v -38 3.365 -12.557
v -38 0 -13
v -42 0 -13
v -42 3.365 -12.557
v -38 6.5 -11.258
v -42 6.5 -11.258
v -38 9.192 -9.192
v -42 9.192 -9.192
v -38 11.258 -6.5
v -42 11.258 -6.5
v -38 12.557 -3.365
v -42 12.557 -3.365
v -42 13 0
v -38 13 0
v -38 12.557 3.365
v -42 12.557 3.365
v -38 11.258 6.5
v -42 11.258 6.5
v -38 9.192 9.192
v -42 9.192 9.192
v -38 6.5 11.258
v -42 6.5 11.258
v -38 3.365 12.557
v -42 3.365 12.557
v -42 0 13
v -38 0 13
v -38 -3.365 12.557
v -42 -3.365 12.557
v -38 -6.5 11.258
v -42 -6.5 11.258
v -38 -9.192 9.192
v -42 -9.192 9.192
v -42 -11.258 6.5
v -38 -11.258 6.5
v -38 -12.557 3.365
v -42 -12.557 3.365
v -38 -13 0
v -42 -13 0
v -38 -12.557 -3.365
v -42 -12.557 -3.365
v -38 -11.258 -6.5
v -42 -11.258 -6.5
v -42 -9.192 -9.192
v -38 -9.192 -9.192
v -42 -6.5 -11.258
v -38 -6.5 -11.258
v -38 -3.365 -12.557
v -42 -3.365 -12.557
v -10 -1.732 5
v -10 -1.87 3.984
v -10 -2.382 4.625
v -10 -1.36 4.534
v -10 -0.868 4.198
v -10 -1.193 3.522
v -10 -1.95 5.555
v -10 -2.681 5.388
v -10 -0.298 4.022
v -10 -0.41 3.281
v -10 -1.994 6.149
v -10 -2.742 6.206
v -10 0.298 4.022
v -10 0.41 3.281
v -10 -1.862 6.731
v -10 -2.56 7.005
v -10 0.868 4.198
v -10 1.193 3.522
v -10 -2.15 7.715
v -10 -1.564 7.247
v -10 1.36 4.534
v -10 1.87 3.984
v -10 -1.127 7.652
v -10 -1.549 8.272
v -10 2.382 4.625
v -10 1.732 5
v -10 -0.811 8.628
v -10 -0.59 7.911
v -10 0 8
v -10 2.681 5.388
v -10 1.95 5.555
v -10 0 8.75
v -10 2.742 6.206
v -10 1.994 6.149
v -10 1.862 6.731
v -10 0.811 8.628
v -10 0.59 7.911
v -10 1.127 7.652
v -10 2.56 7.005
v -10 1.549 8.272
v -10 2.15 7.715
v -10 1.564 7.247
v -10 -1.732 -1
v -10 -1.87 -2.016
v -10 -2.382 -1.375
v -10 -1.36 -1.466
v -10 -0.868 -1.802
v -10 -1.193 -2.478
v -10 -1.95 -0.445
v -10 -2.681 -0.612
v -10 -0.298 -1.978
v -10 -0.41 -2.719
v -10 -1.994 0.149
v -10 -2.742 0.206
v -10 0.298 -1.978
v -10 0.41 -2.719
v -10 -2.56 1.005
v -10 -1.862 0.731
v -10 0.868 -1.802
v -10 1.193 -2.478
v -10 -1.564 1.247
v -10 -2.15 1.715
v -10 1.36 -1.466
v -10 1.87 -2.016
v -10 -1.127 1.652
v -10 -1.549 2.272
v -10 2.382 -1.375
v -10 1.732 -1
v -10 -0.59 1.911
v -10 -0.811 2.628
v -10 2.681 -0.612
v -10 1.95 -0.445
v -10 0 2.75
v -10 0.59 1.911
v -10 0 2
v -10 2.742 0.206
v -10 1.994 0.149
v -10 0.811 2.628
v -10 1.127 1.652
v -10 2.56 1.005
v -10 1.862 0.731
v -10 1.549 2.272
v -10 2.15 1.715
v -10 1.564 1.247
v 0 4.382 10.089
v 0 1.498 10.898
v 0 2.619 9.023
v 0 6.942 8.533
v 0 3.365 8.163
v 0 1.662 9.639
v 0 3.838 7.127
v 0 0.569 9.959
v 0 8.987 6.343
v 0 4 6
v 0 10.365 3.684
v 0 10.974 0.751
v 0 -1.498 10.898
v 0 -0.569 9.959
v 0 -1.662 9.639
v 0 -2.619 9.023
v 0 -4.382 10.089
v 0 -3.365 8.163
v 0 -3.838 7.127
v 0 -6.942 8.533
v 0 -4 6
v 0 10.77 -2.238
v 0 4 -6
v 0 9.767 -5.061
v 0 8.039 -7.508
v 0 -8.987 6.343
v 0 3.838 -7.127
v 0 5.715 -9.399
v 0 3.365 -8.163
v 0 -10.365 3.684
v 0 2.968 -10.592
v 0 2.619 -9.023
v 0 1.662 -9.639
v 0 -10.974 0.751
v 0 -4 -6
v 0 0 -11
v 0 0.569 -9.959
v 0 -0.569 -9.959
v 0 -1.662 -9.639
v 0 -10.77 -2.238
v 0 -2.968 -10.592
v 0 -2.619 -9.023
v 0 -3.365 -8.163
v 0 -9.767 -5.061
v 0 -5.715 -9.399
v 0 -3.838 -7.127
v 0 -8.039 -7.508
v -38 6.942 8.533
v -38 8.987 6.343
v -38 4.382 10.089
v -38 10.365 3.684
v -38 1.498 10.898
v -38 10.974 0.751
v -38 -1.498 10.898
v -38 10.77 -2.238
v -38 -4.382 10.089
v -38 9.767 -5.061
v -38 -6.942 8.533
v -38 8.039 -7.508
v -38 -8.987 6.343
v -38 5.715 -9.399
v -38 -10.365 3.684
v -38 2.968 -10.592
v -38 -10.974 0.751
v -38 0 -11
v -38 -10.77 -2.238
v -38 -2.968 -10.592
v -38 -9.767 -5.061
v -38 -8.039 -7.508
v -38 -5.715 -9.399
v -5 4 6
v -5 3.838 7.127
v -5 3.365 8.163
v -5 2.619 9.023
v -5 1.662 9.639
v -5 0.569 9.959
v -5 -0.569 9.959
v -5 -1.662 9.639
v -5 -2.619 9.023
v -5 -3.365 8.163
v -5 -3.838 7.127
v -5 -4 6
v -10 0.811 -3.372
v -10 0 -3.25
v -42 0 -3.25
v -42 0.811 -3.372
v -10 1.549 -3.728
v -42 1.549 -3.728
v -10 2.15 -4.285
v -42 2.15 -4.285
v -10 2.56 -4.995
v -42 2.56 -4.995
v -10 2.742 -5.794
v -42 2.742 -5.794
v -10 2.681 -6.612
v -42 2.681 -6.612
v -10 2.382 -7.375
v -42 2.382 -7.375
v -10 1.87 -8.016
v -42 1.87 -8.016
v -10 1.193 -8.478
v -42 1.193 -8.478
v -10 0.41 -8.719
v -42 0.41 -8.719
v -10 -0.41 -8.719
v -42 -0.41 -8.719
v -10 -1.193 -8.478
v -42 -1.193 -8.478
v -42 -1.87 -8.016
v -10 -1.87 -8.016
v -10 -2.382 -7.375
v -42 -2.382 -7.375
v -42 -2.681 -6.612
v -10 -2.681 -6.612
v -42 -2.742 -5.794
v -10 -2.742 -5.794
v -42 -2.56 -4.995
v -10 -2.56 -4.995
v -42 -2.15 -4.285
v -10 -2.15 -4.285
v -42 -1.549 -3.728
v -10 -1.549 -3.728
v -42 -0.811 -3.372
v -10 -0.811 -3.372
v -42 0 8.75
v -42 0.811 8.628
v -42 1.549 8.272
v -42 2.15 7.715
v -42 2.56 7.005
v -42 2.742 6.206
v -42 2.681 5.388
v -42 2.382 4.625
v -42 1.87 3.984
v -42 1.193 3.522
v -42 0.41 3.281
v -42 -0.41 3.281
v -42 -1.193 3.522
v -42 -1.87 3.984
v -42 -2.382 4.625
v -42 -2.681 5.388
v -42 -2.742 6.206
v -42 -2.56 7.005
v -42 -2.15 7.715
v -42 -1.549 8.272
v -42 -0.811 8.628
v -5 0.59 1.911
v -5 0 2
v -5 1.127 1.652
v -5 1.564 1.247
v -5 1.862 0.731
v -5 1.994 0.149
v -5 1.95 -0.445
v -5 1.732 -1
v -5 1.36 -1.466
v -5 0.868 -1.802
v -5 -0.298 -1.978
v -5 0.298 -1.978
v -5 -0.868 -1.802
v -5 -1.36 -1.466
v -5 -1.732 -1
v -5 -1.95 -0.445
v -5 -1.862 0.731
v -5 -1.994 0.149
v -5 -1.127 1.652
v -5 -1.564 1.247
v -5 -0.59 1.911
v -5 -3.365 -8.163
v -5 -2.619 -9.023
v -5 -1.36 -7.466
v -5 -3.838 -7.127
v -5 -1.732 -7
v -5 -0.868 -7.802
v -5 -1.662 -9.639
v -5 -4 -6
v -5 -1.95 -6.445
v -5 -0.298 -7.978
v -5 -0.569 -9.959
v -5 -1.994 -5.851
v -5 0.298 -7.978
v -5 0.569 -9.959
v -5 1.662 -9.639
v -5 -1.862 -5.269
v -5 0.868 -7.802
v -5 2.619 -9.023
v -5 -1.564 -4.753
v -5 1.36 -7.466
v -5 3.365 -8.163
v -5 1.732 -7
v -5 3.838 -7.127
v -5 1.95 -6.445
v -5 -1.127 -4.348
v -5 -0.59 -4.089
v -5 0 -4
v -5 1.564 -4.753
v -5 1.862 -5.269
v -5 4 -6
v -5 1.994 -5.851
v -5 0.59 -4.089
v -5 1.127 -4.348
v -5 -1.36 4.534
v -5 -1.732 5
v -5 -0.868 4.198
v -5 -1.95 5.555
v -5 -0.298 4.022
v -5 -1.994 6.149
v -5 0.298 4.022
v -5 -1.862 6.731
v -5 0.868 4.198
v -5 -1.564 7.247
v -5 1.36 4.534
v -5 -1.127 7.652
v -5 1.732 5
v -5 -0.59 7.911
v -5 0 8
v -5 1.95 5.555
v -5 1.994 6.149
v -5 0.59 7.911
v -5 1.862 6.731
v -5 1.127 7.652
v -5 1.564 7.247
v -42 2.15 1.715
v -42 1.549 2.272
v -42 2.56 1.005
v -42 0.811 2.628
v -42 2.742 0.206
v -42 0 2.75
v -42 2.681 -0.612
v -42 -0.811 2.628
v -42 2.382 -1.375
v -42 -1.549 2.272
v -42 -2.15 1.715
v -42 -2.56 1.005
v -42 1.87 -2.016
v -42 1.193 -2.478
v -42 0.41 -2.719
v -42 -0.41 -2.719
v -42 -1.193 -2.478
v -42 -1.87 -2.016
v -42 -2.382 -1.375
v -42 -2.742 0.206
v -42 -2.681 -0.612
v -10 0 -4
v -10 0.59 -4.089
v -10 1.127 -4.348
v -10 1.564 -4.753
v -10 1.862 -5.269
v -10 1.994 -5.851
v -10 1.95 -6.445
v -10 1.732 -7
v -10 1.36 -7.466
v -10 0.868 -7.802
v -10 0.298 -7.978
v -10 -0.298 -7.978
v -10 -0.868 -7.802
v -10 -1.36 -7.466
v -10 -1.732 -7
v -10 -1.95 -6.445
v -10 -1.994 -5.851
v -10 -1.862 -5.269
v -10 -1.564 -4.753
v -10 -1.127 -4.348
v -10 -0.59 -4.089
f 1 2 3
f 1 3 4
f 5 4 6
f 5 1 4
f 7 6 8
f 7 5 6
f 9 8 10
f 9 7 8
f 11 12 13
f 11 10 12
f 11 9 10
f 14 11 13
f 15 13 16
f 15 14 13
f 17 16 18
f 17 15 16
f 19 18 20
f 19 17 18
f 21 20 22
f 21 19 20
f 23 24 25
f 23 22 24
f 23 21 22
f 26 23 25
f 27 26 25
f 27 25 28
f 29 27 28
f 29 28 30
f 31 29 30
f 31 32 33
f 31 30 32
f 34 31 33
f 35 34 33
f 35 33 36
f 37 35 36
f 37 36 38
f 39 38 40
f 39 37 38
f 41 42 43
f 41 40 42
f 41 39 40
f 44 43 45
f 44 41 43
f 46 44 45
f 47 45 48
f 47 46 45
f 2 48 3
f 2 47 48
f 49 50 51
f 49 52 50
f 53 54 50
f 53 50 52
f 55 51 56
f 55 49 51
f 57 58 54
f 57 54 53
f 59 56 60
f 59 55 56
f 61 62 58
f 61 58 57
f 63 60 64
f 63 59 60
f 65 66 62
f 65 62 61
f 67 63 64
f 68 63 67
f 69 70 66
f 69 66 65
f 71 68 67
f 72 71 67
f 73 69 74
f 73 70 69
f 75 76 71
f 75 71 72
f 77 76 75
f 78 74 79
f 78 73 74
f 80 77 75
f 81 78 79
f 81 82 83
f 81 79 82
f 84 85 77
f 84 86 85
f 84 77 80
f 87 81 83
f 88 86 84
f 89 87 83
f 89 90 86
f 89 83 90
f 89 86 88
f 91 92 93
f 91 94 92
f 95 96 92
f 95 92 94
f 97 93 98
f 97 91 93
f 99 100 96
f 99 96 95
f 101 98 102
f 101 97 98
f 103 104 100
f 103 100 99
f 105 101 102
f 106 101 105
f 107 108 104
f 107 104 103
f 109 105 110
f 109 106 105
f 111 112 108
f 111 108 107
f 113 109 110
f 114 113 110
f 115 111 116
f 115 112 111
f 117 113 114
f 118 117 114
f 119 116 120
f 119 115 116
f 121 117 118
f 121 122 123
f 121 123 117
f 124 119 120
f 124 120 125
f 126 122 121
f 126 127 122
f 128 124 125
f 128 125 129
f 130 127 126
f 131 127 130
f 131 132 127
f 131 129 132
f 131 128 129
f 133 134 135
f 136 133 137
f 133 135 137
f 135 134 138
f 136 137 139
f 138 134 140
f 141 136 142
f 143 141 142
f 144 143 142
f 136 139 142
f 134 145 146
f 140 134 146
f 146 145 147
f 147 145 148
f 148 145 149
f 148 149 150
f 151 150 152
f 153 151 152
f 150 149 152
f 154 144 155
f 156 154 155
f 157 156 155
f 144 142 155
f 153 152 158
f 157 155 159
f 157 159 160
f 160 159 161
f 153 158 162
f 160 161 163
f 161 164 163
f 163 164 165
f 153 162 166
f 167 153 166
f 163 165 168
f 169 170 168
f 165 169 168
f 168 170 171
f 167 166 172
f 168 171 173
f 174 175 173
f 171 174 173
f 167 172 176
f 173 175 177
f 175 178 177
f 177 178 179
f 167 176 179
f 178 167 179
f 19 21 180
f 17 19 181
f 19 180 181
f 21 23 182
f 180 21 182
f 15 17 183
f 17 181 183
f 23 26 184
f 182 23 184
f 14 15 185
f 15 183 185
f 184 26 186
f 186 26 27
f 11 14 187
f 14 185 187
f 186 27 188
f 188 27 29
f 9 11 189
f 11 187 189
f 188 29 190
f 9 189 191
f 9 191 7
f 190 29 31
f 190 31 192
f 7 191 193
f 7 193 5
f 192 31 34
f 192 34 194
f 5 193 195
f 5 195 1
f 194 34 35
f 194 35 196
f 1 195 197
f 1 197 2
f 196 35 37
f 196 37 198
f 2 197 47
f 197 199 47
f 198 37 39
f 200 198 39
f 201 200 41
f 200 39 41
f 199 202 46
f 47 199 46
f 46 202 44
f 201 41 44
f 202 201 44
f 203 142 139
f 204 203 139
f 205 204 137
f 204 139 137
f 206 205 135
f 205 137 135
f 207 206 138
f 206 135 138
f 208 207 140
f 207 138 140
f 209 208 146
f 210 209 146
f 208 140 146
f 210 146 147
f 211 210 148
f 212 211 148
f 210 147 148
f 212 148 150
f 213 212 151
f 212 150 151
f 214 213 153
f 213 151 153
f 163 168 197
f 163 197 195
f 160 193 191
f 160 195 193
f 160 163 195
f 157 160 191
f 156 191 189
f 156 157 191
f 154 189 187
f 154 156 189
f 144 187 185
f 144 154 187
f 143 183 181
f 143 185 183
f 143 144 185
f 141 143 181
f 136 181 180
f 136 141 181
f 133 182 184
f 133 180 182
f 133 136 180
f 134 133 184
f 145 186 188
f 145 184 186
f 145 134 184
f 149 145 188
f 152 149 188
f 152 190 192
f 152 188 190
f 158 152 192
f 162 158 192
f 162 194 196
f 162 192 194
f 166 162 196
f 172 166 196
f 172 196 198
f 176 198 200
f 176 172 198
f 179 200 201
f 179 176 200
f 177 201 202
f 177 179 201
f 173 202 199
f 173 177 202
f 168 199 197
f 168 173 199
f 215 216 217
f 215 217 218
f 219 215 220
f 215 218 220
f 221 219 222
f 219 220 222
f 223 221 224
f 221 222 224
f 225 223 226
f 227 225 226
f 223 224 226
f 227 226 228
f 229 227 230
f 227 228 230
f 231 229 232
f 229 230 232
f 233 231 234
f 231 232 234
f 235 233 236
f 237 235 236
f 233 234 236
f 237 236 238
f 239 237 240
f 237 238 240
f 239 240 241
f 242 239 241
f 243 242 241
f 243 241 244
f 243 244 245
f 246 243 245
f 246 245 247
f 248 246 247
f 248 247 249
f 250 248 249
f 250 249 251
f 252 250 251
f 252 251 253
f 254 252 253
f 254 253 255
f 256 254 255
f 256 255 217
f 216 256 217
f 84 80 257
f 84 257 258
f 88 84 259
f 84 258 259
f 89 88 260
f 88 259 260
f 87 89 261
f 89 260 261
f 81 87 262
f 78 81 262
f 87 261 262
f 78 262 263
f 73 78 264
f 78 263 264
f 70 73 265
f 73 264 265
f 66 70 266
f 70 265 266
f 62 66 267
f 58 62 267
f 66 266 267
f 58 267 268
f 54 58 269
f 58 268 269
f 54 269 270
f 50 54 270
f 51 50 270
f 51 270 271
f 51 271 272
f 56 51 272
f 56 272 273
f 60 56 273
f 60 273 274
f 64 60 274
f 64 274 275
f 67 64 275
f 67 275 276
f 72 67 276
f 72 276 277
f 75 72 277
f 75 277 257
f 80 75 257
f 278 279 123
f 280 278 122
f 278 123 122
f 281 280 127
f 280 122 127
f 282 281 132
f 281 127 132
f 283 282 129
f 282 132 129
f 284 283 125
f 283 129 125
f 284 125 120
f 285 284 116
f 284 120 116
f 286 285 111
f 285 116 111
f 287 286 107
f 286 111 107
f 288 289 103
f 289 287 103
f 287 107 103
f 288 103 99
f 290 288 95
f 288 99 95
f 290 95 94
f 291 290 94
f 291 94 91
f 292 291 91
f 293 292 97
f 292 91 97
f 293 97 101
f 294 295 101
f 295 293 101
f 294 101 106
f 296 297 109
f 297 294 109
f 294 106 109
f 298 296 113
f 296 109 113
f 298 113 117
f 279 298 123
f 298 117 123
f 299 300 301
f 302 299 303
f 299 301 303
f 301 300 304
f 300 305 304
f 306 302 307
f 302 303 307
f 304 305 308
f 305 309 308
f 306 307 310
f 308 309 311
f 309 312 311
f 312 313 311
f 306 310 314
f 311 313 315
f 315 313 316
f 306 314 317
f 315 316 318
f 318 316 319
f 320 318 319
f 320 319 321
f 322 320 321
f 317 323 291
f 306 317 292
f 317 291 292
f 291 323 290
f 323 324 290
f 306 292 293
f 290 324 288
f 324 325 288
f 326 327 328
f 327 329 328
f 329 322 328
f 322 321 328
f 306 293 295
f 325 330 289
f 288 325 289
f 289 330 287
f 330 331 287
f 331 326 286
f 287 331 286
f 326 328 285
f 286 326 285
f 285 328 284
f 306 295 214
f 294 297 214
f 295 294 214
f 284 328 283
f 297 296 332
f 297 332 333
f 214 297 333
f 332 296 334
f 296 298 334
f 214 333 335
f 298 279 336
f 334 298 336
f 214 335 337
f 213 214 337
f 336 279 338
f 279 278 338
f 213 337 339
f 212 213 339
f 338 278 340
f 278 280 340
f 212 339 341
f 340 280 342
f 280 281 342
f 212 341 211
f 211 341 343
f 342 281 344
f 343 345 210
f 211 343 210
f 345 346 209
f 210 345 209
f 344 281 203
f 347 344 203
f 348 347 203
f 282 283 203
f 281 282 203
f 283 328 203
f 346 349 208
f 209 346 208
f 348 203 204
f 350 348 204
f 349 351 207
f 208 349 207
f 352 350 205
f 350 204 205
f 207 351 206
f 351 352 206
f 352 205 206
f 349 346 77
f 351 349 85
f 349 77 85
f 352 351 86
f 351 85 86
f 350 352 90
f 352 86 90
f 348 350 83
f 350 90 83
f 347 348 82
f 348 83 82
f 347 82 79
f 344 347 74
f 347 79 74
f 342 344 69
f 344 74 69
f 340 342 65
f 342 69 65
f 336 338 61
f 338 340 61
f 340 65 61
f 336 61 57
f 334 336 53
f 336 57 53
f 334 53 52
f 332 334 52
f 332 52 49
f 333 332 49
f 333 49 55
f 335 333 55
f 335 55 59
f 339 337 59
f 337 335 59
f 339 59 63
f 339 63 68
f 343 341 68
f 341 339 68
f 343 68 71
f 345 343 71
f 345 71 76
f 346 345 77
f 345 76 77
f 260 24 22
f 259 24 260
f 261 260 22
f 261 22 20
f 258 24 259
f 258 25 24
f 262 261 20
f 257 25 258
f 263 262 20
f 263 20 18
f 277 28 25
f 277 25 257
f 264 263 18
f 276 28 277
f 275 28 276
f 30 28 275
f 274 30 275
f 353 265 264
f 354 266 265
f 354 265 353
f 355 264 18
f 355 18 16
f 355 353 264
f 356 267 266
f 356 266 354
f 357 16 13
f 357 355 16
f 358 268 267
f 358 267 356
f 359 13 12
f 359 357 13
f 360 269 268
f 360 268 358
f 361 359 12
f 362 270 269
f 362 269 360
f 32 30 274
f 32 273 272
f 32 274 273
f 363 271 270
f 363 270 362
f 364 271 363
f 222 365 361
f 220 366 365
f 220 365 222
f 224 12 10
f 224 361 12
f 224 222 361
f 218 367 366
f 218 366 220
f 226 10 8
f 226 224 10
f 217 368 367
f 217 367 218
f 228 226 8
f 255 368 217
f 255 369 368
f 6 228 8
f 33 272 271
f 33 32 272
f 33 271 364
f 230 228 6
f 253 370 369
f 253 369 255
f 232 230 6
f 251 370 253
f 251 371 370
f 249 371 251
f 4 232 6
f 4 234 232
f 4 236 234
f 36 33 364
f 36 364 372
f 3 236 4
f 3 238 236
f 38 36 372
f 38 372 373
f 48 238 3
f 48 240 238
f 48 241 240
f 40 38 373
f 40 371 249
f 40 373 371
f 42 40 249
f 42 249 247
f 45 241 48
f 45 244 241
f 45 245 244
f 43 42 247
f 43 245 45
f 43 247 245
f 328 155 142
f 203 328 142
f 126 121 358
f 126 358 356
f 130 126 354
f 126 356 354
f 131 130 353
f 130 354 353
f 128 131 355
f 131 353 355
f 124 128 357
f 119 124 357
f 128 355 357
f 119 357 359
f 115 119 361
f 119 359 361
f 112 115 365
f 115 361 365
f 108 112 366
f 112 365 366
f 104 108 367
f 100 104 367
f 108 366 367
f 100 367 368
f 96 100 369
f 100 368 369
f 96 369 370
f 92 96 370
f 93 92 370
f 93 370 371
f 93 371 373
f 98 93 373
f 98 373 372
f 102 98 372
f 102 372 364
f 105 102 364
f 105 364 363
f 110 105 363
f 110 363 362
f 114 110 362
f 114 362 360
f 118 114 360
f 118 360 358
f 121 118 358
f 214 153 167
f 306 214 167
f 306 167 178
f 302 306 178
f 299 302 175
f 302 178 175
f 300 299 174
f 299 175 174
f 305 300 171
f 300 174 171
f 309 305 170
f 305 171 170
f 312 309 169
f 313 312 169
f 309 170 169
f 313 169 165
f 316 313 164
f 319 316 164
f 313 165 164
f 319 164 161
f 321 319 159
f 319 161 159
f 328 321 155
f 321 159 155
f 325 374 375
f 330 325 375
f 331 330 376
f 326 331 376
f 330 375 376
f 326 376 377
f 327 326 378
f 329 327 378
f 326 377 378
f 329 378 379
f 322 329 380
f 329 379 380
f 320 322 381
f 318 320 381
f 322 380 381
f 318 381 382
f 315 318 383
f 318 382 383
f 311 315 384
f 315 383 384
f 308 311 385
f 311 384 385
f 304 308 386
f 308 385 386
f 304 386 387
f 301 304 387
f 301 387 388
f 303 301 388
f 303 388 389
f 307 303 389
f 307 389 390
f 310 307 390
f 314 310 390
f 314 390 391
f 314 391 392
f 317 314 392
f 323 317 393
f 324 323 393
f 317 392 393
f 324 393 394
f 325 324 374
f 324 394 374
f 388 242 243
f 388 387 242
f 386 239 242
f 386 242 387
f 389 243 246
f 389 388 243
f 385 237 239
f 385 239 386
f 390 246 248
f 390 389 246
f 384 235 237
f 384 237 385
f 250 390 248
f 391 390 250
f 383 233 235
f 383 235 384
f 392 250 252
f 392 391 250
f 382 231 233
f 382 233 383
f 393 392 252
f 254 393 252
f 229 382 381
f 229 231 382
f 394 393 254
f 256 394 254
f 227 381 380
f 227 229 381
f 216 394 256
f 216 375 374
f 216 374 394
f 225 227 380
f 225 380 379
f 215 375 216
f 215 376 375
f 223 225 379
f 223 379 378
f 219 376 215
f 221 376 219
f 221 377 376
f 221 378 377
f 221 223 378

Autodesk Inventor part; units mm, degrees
ref_plane "YZ Plane" through (0, 0, 0) normal (1, 0, 0) x (0, 1, 0)
ref_plane "XZ Plane" through (0, 0, 0) normal (0, 1, 0) x (-1, 0, 0)
ref_plane "XY Plane" through (0, 0, 0) normal (0, 0, 1) x (1, 0, 0)
sketch "Sketch1" plane through (0, 0, 0) normal (0, 1, 0) x (-1, 0, 0)
  line L0 (0, 0) -> (42, 0)
  line L1 (42, 0) -> (42, -13)
  line L2 (42, -13) -> (38, -13)
  line L3 (38, -13) -> (38, -11)
  line L4 (38, -11) -> (0, -11)
  line L5 (0, -11) -> (0, 0)
  dimension "d0" = 22
  dimension "d1" = 38
  dimension "d2" = 26
  dimension "d3" = 4
revolve "Revolution1" add sketch "Sketch1" angle 360 about axis through (0, 0, 0) along (-1, 0, 0)
sketch "Sketch3" plane through (0, 0, 0) normal (0, 1, 0) x (-1, 0, 0)
  line L0 (0, 0) -> (42, 0)
  line L1 (42, 13) -> (42, -13) projected
  line L2 (0, 0) -> (0, 4)
  line L3 (0, 11) -> (0, -11) projected
  line L4 (0, 4) -> (5, 4)
  line L5 (5, 4) -> (5, 2)
  line L6 (5, 2) -> (10, 2)
  line L7 (10, 2) -> (10, 2.75)
  line L8 (10, 2.75) -> (42, 2.75)
  dimension "d16" = 5.5
  dimension "d17" = 8
  dimension "d18" = 4
  dimension "d19" = 5
  dimension "d20" = 5
revolve "Revolution2" cut sketch "Sketch3" angle 360 about axis through (0, 0, 0) along (-1, 0, 0)
pattern_linear "Rectangular Pattern1" count 2 spacing 6 along (0, 0, 1) of "Revolution2"
pattern_linear "Rectangular Pattern2" count 2 spacing 6 along (0, 0, -1) of "Revolution2"
sketch "Sketch4" plane through (0, 0, 0) normal (1, 0, 0) x (0, 0, -1)
  arc A0 (-3, 2.6458) -> (-3, -2.6458) centre (-6, 0) ccw construction
  arc A1 (3, -2.6458) -> (3, 2.6458) centre (6, 0) ccw construction
  circle A2 centre (-6, 0) radius 2 projected
  circle A3 centre (6, 0) radius 2 projected
  line L0 (-6, 0) -> (6, 0) construction
  line L1 (-6, -4) -> (6, -4)
  line L2 (6, 4) -> (-6, 4)
  arc A4 (-6, 4) -> (-6, -4) centre (-6, 0) ccw
  arc A5 (6, -4) -> (6, 4) centre (6, 0) ccw
  point P0 (0, 0)
  point P1 (0, 0)
extrude "Extrusion1" cut sketch "Sketch4" against normal up to surface (5 mm away) contours A2 | A3 | A4 L2 A5 L1
properties part number "029" material "Acetal Resin, White"
